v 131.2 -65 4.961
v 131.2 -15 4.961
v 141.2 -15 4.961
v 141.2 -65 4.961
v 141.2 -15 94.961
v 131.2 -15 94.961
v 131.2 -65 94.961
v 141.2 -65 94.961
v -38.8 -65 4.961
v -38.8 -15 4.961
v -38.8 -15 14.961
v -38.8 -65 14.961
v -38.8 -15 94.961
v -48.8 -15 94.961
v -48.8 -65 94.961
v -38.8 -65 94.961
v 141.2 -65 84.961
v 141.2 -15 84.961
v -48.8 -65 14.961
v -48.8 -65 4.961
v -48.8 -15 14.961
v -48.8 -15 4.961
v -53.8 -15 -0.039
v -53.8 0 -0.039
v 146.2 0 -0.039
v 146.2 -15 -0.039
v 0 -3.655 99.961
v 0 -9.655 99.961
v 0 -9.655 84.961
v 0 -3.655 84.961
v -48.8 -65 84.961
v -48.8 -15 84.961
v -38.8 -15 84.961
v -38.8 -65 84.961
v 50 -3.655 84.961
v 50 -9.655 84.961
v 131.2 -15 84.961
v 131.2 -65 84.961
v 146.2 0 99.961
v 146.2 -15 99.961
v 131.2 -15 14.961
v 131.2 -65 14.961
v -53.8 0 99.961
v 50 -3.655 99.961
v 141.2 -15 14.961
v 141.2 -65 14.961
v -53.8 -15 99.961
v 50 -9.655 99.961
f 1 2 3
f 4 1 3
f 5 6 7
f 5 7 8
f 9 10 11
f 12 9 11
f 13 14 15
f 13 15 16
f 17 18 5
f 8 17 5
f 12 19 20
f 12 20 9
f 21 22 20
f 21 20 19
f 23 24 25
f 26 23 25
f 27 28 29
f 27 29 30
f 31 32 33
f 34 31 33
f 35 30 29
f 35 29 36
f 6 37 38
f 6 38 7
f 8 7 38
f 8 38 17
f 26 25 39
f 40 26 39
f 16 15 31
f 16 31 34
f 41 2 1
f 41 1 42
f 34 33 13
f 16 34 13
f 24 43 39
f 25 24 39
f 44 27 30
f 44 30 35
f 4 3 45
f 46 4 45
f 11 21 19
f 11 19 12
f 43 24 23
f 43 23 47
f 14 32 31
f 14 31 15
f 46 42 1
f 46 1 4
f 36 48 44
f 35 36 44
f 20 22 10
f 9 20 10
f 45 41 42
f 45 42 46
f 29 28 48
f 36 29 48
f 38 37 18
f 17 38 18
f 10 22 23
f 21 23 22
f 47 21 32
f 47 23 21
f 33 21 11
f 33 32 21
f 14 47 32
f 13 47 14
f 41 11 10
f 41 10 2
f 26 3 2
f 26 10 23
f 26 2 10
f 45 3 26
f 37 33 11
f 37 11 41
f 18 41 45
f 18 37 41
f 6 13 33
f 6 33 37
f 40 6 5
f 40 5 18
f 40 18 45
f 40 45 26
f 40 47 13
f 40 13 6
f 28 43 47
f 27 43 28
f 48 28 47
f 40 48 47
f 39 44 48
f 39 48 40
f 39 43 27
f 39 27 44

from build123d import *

# Parameters (mm, degrees)
F0_W     = 200
F0_H     = 100
F1_DEPTH = 15
F2_W     = 10
F2_H     = 10
F3_DEPTH = 50
F4_W     = 50
F4_H     = 6
F5_DEPTH = 10


# Not quite as in the source:
# - a feature names something its author has since deleted; it is built from what else it names


with BuildPart() as f1:
    # F0 (on Front) → F1 (new body)
    with BuildSketch(Plane.XZ):
        with Locations((46.1999992281, 49.9613083565)):
            Rectangle(F0_W, F0_H)
    extrude(amount=F1_DEPTH)

    # F2 (on face) → F3 (join)
    with BuildSketch(Plane.XZ.offset(15)):
        with Locations((-43.8000007719, 89.9613083565)):
            Rectangle(F2_W, F2_H)
        with Locations((-43.8000007719, 9.9613083565)):
            Rectangle(F2_W, F2_H)
        with Locations((136.1999992281, 89.9613083565)):
            Rectangle(F2_W, F2_H)
        with Locations((136.1999992281, 9.9613083565)):
            Rectangle(F2_W, F2_H)
    extrude(amount=F3_DEPTH)

    # F4 (on face) → F5 (cut, symmetric)
    with BuildSketch(Plane.XY.offset(94.9613083565)):
        with Locations((25, -6.6546534393)):
            Rectangle(F4_W, F4_H)
    extrude(amount=F5_DEPTH, both=True, mode=Mode.SUBTRACT)


solid = f1.part
